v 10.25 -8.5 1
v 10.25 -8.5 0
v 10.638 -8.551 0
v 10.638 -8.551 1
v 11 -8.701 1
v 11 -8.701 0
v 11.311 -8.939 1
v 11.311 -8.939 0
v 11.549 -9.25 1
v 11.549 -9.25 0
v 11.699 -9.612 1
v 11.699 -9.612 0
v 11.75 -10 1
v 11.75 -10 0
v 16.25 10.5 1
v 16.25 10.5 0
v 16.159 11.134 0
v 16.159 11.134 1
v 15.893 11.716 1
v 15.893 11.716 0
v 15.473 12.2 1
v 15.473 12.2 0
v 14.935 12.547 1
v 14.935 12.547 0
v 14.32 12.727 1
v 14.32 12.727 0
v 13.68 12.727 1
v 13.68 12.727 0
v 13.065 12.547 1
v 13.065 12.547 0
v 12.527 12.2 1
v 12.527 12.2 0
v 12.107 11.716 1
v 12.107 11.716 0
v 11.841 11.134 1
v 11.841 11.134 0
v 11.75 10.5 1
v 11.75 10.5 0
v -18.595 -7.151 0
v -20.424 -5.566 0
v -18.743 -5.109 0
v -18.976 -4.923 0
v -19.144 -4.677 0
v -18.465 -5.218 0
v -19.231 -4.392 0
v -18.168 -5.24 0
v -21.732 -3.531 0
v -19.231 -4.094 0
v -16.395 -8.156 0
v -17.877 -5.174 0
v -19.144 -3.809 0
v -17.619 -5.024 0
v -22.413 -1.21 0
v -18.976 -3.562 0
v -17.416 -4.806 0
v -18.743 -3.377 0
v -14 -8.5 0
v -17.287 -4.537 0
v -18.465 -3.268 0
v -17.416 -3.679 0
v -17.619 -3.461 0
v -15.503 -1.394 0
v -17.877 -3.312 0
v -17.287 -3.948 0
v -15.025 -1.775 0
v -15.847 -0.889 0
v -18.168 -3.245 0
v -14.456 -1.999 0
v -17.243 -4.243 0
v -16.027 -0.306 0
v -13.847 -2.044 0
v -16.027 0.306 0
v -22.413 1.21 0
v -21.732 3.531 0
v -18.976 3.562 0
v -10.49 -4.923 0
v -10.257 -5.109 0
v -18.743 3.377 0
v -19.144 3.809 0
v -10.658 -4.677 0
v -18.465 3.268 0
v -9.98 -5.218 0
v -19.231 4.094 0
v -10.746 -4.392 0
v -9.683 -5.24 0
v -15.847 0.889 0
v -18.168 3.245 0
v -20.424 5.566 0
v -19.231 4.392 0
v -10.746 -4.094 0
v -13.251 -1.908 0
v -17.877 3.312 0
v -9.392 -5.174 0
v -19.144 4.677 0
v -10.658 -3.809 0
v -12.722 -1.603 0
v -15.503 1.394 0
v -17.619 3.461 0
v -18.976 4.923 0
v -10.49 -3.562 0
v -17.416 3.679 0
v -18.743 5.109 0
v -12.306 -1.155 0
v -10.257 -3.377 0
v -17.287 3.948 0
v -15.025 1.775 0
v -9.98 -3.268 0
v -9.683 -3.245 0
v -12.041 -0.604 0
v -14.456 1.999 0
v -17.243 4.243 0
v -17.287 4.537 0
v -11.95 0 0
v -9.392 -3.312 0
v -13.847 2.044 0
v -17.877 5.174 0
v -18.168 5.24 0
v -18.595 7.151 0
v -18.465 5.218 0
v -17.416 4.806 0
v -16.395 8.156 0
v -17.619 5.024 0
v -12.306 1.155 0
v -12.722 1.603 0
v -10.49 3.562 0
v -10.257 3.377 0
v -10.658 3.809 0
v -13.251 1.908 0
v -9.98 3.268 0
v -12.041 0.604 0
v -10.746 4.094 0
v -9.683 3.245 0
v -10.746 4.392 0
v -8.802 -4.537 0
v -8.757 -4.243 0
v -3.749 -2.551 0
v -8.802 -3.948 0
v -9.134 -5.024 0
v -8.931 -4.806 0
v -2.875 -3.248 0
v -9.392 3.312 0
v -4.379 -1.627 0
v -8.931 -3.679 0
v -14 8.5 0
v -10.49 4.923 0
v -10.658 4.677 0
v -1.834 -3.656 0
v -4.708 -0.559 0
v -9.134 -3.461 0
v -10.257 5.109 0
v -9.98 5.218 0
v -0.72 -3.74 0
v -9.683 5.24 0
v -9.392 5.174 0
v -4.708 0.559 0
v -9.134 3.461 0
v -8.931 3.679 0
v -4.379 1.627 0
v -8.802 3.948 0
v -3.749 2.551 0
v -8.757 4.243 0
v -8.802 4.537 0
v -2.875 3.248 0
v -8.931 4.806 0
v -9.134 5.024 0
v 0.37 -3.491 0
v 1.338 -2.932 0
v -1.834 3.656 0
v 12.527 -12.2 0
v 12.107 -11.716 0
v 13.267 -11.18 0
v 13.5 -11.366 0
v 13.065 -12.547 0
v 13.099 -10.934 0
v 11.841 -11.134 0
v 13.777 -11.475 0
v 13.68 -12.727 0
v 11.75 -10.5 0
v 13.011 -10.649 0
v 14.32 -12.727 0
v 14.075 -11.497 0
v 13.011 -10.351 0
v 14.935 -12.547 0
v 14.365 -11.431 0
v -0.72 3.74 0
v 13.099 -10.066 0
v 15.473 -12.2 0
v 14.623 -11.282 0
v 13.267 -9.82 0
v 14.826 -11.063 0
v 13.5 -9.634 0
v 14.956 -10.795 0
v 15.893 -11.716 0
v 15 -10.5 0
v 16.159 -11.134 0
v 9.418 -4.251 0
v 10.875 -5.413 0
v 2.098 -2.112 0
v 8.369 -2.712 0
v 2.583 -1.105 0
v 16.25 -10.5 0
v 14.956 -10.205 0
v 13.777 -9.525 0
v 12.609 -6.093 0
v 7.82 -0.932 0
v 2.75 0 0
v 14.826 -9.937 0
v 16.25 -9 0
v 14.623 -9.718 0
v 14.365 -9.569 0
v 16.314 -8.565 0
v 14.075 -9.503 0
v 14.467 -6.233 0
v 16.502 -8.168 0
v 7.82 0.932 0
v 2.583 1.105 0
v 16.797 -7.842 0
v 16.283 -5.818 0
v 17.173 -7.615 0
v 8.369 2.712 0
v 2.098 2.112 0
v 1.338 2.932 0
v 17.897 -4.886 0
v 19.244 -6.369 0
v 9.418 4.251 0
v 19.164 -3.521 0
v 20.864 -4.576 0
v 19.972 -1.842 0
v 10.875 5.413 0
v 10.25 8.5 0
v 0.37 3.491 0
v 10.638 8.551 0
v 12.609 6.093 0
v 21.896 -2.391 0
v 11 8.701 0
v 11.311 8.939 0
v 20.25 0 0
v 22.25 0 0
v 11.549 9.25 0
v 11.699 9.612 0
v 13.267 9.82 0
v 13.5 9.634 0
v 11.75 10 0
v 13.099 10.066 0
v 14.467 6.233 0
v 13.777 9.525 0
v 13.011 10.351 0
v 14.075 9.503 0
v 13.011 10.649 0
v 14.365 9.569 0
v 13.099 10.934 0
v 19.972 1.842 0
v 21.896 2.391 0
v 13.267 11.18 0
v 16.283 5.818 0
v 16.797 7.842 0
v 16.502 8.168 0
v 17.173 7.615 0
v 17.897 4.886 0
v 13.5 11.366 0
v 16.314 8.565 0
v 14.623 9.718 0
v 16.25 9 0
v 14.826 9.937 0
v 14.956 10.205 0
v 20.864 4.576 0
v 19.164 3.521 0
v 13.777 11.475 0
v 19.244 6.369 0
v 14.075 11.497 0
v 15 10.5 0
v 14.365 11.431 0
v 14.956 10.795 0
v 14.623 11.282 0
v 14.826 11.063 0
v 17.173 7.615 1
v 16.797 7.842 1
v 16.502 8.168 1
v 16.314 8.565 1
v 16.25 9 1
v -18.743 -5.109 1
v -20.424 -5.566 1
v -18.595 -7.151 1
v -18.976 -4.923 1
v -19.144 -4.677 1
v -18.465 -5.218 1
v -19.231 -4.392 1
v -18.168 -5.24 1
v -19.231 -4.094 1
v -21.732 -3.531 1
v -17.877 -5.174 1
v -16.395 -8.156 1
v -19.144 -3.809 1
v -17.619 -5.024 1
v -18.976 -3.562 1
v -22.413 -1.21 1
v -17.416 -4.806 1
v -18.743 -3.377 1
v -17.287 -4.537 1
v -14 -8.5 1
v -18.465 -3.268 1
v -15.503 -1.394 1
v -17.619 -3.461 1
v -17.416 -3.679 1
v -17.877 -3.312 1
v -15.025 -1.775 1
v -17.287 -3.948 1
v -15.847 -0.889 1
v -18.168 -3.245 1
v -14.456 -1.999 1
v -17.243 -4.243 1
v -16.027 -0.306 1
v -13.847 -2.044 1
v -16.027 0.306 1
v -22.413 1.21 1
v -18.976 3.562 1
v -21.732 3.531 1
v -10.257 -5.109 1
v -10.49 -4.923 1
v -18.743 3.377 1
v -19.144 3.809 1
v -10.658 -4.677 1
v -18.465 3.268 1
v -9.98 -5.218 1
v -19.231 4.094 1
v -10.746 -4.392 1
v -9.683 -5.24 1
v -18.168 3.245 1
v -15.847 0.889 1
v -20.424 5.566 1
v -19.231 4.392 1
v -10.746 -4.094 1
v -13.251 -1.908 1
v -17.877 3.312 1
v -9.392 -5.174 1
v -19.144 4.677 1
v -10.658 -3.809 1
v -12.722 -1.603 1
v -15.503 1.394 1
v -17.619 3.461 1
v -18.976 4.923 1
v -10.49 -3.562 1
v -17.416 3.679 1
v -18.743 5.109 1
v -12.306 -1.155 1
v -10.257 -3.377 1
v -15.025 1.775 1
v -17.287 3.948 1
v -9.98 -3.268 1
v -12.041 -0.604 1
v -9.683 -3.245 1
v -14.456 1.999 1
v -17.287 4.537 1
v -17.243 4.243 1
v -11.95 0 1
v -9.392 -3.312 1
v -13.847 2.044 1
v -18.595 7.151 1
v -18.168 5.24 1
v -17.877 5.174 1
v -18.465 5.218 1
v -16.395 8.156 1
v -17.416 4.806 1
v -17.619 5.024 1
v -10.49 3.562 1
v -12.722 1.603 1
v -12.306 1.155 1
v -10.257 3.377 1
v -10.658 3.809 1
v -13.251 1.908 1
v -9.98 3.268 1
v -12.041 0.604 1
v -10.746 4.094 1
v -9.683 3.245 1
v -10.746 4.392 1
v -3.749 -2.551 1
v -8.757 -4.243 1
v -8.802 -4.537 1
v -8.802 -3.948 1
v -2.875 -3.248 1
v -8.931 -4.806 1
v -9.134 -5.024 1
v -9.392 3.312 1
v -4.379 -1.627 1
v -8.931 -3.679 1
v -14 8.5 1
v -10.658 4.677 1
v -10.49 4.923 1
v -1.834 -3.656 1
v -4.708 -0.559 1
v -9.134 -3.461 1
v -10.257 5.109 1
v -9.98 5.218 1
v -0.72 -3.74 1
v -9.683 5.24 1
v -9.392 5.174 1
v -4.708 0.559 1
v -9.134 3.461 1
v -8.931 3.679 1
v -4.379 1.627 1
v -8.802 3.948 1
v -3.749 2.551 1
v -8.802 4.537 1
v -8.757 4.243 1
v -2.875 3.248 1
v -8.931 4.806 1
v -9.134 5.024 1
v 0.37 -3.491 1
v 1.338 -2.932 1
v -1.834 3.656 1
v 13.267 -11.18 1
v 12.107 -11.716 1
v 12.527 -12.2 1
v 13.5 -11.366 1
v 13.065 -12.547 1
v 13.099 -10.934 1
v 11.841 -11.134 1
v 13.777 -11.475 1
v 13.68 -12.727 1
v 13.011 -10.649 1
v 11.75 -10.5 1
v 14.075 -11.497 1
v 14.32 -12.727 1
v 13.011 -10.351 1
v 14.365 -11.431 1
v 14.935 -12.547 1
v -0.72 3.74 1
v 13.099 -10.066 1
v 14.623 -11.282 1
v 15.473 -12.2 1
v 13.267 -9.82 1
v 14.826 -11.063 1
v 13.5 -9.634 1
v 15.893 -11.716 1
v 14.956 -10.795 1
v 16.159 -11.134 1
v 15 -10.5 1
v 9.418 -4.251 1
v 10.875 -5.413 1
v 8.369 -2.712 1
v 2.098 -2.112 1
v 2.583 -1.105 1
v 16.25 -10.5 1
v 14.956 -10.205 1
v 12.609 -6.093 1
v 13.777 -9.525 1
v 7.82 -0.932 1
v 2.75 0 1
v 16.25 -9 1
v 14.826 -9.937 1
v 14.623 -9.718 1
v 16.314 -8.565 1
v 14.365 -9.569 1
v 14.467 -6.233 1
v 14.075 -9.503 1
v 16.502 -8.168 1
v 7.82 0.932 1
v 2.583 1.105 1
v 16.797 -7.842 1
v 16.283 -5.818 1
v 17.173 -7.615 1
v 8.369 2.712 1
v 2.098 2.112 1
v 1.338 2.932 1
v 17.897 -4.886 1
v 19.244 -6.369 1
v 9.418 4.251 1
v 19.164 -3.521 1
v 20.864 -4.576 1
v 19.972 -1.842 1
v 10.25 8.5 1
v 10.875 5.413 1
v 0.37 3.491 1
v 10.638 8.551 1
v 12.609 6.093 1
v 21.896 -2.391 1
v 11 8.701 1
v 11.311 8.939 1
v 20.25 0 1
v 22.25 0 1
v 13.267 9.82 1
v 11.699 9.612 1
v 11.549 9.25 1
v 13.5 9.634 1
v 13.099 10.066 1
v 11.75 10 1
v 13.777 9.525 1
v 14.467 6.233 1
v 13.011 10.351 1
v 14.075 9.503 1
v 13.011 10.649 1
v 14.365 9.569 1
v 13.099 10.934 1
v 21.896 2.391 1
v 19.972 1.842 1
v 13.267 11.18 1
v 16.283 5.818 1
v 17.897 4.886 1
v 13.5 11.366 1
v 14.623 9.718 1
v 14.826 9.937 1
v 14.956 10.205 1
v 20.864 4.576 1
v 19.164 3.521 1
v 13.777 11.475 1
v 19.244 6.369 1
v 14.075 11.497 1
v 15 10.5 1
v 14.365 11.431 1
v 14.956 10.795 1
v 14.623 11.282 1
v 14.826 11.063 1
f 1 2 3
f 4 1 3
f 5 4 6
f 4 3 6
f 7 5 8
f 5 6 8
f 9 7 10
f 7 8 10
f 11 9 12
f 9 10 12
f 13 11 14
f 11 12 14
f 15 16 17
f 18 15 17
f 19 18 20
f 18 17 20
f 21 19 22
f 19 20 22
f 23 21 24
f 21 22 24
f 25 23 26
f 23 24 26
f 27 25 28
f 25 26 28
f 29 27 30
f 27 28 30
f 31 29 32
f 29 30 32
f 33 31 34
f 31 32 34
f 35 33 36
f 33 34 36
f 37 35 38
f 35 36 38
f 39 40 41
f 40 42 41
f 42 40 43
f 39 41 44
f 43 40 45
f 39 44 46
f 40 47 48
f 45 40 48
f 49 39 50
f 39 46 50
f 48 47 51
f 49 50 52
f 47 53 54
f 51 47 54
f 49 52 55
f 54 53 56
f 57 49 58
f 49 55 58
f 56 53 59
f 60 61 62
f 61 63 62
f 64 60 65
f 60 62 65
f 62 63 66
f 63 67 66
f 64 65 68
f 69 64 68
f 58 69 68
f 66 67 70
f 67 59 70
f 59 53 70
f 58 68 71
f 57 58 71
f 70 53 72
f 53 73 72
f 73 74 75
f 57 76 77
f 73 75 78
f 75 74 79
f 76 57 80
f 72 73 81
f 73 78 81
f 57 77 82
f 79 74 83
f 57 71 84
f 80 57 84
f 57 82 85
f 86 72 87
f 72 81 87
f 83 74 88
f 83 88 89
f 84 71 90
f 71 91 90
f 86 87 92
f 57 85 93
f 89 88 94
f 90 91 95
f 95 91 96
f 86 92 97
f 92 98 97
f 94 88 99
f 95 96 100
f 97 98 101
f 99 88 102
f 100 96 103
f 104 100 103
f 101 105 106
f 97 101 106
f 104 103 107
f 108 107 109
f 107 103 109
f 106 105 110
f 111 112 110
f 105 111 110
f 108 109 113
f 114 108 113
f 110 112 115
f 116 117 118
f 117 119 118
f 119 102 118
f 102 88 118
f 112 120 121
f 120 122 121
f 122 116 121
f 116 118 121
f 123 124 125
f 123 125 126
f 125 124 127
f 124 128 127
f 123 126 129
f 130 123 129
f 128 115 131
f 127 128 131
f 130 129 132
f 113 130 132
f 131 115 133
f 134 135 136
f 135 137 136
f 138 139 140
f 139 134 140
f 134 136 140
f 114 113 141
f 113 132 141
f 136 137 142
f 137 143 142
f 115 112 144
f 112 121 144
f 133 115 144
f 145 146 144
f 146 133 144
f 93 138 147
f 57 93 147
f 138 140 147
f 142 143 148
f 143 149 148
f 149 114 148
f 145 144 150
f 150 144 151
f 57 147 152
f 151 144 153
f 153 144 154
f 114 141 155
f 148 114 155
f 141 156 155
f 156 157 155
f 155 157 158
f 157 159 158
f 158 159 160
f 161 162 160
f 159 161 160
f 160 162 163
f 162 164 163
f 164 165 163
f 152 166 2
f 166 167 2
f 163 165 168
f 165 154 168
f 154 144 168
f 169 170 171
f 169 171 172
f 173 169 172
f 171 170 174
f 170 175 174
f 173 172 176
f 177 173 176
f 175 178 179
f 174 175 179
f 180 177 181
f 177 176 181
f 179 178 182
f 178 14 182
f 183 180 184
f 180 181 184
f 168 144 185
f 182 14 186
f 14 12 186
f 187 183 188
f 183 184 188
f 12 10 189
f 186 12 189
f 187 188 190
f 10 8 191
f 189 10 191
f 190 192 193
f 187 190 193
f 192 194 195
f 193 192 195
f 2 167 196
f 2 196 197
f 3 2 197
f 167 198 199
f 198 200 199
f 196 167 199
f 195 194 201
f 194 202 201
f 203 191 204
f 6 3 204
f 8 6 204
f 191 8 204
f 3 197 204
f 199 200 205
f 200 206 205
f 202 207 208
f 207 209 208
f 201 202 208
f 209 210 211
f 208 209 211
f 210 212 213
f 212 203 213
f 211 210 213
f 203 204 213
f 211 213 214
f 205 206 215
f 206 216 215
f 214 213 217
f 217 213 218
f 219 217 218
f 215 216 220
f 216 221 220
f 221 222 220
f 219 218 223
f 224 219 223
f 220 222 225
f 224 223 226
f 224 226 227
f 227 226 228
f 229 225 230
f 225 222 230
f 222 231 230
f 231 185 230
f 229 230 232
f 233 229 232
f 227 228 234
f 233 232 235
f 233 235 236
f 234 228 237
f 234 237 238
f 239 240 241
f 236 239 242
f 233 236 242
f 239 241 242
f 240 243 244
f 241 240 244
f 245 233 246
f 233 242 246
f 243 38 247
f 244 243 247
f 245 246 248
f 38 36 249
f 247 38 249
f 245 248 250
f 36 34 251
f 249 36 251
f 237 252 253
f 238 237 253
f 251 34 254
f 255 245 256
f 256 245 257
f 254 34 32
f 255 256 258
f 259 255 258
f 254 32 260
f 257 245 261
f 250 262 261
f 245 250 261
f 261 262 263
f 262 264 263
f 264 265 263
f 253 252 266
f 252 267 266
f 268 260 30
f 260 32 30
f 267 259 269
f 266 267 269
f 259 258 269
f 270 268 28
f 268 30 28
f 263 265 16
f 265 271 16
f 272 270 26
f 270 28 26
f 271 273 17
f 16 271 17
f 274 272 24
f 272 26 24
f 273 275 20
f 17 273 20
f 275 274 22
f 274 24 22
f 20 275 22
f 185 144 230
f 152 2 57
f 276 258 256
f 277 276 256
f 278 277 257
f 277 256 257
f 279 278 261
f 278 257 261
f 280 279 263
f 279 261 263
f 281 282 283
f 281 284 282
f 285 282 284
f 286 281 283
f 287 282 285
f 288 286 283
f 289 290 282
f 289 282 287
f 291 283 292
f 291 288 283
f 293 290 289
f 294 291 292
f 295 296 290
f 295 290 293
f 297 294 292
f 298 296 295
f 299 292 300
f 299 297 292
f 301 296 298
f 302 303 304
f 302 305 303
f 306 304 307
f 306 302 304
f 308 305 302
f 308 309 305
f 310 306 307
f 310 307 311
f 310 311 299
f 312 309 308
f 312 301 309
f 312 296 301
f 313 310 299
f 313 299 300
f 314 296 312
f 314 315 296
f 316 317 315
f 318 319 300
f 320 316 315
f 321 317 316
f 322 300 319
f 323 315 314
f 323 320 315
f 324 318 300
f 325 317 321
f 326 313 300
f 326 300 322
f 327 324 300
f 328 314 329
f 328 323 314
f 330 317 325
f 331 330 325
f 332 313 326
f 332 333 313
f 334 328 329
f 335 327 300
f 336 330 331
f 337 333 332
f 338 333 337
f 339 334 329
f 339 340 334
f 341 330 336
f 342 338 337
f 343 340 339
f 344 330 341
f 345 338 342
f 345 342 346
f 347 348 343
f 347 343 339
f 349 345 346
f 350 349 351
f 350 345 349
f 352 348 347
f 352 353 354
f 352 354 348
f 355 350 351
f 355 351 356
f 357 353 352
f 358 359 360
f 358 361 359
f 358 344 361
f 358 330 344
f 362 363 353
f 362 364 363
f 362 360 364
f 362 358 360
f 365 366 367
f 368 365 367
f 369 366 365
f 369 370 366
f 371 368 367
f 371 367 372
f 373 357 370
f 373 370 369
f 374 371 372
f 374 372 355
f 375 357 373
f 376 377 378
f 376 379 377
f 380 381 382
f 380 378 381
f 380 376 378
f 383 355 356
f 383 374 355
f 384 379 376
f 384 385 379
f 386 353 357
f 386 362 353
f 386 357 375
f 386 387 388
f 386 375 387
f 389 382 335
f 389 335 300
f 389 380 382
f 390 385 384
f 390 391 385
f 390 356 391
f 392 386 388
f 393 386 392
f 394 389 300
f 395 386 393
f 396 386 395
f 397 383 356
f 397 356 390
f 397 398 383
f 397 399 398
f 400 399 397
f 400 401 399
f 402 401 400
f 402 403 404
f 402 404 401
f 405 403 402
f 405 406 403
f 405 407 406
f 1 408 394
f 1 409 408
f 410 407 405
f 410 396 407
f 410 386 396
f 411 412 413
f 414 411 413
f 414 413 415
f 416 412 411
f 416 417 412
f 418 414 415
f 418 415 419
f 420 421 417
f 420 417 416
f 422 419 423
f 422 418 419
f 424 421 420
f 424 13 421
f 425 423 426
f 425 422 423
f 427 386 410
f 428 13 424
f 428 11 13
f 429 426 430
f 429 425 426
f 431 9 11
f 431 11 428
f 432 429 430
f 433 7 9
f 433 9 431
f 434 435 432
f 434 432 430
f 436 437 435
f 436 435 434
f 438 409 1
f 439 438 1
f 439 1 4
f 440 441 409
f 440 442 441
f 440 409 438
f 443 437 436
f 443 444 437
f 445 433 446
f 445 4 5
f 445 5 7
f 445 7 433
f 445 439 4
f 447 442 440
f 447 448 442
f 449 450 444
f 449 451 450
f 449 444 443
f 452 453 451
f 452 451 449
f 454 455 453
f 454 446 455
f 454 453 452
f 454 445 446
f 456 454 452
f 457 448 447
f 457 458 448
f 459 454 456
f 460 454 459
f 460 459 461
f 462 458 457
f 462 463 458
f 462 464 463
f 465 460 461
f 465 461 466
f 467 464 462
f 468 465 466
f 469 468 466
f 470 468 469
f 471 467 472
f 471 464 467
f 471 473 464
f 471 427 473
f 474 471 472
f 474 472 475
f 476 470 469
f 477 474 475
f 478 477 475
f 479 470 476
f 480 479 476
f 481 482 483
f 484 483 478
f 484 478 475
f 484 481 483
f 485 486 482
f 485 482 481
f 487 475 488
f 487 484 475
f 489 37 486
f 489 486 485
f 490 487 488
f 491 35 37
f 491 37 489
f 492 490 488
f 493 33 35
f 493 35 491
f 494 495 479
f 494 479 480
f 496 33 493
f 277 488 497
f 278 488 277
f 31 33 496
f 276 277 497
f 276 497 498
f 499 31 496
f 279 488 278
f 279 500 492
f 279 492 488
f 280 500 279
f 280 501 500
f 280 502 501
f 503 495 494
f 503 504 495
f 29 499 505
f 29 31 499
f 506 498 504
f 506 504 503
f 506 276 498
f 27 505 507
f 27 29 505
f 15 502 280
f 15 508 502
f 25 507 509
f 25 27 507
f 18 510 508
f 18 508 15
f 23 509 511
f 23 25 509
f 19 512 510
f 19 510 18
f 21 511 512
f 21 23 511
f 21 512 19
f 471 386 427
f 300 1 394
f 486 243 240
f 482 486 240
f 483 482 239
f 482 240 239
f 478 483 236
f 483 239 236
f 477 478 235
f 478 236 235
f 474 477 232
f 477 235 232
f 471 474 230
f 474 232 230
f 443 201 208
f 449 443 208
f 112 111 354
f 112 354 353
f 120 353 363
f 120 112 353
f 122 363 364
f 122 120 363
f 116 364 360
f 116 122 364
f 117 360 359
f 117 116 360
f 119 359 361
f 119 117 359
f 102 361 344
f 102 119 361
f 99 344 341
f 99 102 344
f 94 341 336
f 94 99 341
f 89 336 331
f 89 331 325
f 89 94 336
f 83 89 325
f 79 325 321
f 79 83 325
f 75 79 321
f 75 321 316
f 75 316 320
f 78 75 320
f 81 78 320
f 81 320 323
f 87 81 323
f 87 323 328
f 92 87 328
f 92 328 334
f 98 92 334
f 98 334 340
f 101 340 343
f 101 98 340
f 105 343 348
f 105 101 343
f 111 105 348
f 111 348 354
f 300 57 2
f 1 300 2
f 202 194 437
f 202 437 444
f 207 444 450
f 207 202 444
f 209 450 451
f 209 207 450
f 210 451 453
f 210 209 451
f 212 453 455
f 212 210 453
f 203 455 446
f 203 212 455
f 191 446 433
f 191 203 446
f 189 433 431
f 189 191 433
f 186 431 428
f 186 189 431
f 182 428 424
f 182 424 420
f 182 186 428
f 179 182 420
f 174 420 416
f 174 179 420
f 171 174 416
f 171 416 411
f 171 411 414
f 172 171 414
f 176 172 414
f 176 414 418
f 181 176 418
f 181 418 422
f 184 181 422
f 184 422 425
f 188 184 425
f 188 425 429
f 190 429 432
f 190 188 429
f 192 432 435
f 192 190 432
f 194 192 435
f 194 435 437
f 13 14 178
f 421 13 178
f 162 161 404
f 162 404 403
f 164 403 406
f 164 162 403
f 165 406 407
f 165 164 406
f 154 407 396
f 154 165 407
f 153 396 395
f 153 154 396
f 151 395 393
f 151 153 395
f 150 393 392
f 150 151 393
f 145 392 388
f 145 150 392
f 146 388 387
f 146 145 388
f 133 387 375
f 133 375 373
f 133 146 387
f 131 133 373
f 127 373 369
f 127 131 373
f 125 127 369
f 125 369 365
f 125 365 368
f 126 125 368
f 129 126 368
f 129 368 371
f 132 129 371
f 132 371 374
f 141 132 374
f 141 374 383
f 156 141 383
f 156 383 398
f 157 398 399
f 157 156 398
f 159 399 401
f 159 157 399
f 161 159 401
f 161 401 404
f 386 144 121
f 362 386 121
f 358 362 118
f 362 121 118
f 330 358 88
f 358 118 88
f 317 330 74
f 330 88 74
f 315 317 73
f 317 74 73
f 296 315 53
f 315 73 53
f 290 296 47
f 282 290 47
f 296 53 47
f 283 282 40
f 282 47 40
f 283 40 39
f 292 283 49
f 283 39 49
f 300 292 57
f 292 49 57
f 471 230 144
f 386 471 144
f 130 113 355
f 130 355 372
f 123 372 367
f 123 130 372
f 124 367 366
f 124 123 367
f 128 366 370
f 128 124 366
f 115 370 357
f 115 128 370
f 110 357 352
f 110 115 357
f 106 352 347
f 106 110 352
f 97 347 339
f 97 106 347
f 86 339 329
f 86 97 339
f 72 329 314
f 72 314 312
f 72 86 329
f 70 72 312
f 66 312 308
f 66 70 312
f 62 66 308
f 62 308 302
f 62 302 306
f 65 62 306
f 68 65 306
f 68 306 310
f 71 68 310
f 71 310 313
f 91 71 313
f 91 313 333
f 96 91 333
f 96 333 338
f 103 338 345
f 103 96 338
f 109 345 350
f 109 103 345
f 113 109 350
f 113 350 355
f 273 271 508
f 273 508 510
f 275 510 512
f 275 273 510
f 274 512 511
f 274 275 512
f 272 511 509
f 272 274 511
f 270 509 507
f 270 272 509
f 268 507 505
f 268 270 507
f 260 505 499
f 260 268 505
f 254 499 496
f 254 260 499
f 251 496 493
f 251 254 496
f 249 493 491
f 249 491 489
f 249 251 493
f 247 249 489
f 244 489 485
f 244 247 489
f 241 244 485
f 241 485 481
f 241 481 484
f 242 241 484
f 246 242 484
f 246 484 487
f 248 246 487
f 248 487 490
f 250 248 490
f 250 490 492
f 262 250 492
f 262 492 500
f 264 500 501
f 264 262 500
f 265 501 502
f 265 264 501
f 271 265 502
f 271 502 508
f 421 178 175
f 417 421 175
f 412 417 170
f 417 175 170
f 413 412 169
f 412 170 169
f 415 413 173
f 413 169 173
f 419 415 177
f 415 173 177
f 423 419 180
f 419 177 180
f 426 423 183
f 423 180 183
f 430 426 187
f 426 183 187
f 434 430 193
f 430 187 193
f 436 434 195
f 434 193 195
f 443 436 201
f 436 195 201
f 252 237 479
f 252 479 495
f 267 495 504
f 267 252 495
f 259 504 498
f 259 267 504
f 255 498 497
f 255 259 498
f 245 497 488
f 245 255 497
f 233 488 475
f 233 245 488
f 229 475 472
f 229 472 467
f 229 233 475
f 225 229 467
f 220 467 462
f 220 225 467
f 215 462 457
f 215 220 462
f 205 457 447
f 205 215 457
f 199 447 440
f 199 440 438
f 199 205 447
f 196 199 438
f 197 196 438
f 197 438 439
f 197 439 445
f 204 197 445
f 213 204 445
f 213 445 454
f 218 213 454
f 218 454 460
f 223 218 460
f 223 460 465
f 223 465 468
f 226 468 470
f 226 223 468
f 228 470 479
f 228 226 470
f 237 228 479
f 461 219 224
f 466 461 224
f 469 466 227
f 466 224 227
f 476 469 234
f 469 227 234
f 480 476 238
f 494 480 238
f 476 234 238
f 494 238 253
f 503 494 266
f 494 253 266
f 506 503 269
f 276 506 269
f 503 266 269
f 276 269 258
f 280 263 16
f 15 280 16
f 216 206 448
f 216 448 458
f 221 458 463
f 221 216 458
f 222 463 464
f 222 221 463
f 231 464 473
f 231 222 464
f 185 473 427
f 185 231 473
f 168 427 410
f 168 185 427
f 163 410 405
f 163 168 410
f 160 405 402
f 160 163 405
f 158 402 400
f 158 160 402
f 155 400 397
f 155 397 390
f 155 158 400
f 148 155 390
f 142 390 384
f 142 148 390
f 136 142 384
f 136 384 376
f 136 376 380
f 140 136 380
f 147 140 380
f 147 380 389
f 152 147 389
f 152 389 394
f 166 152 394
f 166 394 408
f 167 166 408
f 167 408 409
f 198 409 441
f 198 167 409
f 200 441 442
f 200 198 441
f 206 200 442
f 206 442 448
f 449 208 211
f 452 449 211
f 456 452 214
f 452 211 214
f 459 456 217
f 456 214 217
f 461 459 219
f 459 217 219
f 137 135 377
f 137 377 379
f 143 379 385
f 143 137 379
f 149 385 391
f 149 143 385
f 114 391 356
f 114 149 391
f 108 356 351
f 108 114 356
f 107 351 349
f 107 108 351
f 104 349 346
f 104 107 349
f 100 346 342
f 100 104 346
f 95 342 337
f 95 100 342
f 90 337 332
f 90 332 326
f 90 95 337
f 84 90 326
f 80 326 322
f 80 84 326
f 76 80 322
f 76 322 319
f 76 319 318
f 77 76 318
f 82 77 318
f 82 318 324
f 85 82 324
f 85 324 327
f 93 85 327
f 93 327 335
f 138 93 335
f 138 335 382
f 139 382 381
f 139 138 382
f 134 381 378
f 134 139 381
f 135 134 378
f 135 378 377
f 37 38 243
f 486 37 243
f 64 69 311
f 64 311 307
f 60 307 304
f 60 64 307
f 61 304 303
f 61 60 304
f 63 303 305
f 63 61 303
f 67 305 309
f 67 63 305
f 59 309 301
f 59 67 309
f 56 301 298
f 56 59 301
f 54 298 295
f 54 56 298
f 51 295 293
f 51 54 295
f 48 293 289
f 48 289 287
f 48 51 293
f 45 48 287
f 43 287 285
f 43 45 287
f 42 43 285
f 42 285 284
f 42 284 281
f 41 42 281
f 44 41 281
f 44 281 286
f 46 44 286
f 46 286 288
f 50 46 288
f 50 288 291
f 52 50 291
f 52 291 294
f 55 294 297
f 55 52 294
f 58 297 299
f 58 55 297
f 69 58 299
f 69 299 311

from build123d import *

# Parameters (mm, degrees)
F0_R     = 1
F0_R_2   = 2.05
F0_R_3   = 3.75
F0_R_4   = 6.25
F1_DEPTH = 1


with BuildPart() as f1:
    # F0 (on Top) → F1 (new body)
    with BuildSketch(Plane.XY):
        with BuildLine():
            Line((16.25, 9), (16.25, 10.5))
            ThreePointArc((16.25, 10.5), (14, 12.75), (11.75, 10.5))
            Line((11.75, 10.5), (11.75, 10))
            ThreePointArc((11.75, 10), (11.31066, 8.93934), (10.25, 8.5))
            Line((10.25, 8.5), (-14, 8.5))
            ThreePointArc((-14, 8.5), (-22.5, 0), (-14, -8.5))
            Line((-14, -8.5), (10.25, -8.5))
            ThreePointArc((10.25, -8.5), (11.31066, -8.93934), (11.75, -10))
            Line((11.75, -10), (11.75, -10.5))
            ThreePointArc((11.75, -10.5), (14, -12.75), (16.25, -10.5))
            Line((16.25, -10.5), (16.25, -9))
            ThreePointArc((16.25, -9), (16.501925, -8.16795), (17.173077, -7.615385))
            ThreePointArc((17.173077, -7.615385), (22.25, 0), (17.173077, 7.615385))
            ThreePointArc((17.173077, 7.615385), (16.501925, 8.16795), (16.25, 9))
        make_face()
        with Locations((-18.242641, -4.242641)):
            Circle(F0_R, mode=Mode.SUBTRACT)
        with Locations((-9.757359, -4.242641)):
            Circle(F0_R, mode=Mode.SUBTRACT)
        with Locations((14, -10.5)):
            Circle(F0_R, mode=Mode.SUBTRACT)
        with Locations((-14, 0)):
            Circle(F0_R_2, mode=Mode.SUBTRACT)
        with Locations((-18.242641, 4.242641)):
            Circle(F0_R, mode=Mode.SUBTRACT)
        with Locations((-9.757359, 4.242641)):
            Circle(F0_R, mode=Mode.SUBTRACT)
        with Locations((-1, 0)):
            Circle(F0_R_3, mode=Mode.SUBTRACT)
        with Locations((14, 0)):
            Circle(F0_R_4, mode=Mode.SUBTRACT)
        with Locations((14, 10.5)):
            Circle(F0_R, mode=Mode.SUBTRACT)
    extrude(amount=F1_DEPTH)


solid = f1.part
